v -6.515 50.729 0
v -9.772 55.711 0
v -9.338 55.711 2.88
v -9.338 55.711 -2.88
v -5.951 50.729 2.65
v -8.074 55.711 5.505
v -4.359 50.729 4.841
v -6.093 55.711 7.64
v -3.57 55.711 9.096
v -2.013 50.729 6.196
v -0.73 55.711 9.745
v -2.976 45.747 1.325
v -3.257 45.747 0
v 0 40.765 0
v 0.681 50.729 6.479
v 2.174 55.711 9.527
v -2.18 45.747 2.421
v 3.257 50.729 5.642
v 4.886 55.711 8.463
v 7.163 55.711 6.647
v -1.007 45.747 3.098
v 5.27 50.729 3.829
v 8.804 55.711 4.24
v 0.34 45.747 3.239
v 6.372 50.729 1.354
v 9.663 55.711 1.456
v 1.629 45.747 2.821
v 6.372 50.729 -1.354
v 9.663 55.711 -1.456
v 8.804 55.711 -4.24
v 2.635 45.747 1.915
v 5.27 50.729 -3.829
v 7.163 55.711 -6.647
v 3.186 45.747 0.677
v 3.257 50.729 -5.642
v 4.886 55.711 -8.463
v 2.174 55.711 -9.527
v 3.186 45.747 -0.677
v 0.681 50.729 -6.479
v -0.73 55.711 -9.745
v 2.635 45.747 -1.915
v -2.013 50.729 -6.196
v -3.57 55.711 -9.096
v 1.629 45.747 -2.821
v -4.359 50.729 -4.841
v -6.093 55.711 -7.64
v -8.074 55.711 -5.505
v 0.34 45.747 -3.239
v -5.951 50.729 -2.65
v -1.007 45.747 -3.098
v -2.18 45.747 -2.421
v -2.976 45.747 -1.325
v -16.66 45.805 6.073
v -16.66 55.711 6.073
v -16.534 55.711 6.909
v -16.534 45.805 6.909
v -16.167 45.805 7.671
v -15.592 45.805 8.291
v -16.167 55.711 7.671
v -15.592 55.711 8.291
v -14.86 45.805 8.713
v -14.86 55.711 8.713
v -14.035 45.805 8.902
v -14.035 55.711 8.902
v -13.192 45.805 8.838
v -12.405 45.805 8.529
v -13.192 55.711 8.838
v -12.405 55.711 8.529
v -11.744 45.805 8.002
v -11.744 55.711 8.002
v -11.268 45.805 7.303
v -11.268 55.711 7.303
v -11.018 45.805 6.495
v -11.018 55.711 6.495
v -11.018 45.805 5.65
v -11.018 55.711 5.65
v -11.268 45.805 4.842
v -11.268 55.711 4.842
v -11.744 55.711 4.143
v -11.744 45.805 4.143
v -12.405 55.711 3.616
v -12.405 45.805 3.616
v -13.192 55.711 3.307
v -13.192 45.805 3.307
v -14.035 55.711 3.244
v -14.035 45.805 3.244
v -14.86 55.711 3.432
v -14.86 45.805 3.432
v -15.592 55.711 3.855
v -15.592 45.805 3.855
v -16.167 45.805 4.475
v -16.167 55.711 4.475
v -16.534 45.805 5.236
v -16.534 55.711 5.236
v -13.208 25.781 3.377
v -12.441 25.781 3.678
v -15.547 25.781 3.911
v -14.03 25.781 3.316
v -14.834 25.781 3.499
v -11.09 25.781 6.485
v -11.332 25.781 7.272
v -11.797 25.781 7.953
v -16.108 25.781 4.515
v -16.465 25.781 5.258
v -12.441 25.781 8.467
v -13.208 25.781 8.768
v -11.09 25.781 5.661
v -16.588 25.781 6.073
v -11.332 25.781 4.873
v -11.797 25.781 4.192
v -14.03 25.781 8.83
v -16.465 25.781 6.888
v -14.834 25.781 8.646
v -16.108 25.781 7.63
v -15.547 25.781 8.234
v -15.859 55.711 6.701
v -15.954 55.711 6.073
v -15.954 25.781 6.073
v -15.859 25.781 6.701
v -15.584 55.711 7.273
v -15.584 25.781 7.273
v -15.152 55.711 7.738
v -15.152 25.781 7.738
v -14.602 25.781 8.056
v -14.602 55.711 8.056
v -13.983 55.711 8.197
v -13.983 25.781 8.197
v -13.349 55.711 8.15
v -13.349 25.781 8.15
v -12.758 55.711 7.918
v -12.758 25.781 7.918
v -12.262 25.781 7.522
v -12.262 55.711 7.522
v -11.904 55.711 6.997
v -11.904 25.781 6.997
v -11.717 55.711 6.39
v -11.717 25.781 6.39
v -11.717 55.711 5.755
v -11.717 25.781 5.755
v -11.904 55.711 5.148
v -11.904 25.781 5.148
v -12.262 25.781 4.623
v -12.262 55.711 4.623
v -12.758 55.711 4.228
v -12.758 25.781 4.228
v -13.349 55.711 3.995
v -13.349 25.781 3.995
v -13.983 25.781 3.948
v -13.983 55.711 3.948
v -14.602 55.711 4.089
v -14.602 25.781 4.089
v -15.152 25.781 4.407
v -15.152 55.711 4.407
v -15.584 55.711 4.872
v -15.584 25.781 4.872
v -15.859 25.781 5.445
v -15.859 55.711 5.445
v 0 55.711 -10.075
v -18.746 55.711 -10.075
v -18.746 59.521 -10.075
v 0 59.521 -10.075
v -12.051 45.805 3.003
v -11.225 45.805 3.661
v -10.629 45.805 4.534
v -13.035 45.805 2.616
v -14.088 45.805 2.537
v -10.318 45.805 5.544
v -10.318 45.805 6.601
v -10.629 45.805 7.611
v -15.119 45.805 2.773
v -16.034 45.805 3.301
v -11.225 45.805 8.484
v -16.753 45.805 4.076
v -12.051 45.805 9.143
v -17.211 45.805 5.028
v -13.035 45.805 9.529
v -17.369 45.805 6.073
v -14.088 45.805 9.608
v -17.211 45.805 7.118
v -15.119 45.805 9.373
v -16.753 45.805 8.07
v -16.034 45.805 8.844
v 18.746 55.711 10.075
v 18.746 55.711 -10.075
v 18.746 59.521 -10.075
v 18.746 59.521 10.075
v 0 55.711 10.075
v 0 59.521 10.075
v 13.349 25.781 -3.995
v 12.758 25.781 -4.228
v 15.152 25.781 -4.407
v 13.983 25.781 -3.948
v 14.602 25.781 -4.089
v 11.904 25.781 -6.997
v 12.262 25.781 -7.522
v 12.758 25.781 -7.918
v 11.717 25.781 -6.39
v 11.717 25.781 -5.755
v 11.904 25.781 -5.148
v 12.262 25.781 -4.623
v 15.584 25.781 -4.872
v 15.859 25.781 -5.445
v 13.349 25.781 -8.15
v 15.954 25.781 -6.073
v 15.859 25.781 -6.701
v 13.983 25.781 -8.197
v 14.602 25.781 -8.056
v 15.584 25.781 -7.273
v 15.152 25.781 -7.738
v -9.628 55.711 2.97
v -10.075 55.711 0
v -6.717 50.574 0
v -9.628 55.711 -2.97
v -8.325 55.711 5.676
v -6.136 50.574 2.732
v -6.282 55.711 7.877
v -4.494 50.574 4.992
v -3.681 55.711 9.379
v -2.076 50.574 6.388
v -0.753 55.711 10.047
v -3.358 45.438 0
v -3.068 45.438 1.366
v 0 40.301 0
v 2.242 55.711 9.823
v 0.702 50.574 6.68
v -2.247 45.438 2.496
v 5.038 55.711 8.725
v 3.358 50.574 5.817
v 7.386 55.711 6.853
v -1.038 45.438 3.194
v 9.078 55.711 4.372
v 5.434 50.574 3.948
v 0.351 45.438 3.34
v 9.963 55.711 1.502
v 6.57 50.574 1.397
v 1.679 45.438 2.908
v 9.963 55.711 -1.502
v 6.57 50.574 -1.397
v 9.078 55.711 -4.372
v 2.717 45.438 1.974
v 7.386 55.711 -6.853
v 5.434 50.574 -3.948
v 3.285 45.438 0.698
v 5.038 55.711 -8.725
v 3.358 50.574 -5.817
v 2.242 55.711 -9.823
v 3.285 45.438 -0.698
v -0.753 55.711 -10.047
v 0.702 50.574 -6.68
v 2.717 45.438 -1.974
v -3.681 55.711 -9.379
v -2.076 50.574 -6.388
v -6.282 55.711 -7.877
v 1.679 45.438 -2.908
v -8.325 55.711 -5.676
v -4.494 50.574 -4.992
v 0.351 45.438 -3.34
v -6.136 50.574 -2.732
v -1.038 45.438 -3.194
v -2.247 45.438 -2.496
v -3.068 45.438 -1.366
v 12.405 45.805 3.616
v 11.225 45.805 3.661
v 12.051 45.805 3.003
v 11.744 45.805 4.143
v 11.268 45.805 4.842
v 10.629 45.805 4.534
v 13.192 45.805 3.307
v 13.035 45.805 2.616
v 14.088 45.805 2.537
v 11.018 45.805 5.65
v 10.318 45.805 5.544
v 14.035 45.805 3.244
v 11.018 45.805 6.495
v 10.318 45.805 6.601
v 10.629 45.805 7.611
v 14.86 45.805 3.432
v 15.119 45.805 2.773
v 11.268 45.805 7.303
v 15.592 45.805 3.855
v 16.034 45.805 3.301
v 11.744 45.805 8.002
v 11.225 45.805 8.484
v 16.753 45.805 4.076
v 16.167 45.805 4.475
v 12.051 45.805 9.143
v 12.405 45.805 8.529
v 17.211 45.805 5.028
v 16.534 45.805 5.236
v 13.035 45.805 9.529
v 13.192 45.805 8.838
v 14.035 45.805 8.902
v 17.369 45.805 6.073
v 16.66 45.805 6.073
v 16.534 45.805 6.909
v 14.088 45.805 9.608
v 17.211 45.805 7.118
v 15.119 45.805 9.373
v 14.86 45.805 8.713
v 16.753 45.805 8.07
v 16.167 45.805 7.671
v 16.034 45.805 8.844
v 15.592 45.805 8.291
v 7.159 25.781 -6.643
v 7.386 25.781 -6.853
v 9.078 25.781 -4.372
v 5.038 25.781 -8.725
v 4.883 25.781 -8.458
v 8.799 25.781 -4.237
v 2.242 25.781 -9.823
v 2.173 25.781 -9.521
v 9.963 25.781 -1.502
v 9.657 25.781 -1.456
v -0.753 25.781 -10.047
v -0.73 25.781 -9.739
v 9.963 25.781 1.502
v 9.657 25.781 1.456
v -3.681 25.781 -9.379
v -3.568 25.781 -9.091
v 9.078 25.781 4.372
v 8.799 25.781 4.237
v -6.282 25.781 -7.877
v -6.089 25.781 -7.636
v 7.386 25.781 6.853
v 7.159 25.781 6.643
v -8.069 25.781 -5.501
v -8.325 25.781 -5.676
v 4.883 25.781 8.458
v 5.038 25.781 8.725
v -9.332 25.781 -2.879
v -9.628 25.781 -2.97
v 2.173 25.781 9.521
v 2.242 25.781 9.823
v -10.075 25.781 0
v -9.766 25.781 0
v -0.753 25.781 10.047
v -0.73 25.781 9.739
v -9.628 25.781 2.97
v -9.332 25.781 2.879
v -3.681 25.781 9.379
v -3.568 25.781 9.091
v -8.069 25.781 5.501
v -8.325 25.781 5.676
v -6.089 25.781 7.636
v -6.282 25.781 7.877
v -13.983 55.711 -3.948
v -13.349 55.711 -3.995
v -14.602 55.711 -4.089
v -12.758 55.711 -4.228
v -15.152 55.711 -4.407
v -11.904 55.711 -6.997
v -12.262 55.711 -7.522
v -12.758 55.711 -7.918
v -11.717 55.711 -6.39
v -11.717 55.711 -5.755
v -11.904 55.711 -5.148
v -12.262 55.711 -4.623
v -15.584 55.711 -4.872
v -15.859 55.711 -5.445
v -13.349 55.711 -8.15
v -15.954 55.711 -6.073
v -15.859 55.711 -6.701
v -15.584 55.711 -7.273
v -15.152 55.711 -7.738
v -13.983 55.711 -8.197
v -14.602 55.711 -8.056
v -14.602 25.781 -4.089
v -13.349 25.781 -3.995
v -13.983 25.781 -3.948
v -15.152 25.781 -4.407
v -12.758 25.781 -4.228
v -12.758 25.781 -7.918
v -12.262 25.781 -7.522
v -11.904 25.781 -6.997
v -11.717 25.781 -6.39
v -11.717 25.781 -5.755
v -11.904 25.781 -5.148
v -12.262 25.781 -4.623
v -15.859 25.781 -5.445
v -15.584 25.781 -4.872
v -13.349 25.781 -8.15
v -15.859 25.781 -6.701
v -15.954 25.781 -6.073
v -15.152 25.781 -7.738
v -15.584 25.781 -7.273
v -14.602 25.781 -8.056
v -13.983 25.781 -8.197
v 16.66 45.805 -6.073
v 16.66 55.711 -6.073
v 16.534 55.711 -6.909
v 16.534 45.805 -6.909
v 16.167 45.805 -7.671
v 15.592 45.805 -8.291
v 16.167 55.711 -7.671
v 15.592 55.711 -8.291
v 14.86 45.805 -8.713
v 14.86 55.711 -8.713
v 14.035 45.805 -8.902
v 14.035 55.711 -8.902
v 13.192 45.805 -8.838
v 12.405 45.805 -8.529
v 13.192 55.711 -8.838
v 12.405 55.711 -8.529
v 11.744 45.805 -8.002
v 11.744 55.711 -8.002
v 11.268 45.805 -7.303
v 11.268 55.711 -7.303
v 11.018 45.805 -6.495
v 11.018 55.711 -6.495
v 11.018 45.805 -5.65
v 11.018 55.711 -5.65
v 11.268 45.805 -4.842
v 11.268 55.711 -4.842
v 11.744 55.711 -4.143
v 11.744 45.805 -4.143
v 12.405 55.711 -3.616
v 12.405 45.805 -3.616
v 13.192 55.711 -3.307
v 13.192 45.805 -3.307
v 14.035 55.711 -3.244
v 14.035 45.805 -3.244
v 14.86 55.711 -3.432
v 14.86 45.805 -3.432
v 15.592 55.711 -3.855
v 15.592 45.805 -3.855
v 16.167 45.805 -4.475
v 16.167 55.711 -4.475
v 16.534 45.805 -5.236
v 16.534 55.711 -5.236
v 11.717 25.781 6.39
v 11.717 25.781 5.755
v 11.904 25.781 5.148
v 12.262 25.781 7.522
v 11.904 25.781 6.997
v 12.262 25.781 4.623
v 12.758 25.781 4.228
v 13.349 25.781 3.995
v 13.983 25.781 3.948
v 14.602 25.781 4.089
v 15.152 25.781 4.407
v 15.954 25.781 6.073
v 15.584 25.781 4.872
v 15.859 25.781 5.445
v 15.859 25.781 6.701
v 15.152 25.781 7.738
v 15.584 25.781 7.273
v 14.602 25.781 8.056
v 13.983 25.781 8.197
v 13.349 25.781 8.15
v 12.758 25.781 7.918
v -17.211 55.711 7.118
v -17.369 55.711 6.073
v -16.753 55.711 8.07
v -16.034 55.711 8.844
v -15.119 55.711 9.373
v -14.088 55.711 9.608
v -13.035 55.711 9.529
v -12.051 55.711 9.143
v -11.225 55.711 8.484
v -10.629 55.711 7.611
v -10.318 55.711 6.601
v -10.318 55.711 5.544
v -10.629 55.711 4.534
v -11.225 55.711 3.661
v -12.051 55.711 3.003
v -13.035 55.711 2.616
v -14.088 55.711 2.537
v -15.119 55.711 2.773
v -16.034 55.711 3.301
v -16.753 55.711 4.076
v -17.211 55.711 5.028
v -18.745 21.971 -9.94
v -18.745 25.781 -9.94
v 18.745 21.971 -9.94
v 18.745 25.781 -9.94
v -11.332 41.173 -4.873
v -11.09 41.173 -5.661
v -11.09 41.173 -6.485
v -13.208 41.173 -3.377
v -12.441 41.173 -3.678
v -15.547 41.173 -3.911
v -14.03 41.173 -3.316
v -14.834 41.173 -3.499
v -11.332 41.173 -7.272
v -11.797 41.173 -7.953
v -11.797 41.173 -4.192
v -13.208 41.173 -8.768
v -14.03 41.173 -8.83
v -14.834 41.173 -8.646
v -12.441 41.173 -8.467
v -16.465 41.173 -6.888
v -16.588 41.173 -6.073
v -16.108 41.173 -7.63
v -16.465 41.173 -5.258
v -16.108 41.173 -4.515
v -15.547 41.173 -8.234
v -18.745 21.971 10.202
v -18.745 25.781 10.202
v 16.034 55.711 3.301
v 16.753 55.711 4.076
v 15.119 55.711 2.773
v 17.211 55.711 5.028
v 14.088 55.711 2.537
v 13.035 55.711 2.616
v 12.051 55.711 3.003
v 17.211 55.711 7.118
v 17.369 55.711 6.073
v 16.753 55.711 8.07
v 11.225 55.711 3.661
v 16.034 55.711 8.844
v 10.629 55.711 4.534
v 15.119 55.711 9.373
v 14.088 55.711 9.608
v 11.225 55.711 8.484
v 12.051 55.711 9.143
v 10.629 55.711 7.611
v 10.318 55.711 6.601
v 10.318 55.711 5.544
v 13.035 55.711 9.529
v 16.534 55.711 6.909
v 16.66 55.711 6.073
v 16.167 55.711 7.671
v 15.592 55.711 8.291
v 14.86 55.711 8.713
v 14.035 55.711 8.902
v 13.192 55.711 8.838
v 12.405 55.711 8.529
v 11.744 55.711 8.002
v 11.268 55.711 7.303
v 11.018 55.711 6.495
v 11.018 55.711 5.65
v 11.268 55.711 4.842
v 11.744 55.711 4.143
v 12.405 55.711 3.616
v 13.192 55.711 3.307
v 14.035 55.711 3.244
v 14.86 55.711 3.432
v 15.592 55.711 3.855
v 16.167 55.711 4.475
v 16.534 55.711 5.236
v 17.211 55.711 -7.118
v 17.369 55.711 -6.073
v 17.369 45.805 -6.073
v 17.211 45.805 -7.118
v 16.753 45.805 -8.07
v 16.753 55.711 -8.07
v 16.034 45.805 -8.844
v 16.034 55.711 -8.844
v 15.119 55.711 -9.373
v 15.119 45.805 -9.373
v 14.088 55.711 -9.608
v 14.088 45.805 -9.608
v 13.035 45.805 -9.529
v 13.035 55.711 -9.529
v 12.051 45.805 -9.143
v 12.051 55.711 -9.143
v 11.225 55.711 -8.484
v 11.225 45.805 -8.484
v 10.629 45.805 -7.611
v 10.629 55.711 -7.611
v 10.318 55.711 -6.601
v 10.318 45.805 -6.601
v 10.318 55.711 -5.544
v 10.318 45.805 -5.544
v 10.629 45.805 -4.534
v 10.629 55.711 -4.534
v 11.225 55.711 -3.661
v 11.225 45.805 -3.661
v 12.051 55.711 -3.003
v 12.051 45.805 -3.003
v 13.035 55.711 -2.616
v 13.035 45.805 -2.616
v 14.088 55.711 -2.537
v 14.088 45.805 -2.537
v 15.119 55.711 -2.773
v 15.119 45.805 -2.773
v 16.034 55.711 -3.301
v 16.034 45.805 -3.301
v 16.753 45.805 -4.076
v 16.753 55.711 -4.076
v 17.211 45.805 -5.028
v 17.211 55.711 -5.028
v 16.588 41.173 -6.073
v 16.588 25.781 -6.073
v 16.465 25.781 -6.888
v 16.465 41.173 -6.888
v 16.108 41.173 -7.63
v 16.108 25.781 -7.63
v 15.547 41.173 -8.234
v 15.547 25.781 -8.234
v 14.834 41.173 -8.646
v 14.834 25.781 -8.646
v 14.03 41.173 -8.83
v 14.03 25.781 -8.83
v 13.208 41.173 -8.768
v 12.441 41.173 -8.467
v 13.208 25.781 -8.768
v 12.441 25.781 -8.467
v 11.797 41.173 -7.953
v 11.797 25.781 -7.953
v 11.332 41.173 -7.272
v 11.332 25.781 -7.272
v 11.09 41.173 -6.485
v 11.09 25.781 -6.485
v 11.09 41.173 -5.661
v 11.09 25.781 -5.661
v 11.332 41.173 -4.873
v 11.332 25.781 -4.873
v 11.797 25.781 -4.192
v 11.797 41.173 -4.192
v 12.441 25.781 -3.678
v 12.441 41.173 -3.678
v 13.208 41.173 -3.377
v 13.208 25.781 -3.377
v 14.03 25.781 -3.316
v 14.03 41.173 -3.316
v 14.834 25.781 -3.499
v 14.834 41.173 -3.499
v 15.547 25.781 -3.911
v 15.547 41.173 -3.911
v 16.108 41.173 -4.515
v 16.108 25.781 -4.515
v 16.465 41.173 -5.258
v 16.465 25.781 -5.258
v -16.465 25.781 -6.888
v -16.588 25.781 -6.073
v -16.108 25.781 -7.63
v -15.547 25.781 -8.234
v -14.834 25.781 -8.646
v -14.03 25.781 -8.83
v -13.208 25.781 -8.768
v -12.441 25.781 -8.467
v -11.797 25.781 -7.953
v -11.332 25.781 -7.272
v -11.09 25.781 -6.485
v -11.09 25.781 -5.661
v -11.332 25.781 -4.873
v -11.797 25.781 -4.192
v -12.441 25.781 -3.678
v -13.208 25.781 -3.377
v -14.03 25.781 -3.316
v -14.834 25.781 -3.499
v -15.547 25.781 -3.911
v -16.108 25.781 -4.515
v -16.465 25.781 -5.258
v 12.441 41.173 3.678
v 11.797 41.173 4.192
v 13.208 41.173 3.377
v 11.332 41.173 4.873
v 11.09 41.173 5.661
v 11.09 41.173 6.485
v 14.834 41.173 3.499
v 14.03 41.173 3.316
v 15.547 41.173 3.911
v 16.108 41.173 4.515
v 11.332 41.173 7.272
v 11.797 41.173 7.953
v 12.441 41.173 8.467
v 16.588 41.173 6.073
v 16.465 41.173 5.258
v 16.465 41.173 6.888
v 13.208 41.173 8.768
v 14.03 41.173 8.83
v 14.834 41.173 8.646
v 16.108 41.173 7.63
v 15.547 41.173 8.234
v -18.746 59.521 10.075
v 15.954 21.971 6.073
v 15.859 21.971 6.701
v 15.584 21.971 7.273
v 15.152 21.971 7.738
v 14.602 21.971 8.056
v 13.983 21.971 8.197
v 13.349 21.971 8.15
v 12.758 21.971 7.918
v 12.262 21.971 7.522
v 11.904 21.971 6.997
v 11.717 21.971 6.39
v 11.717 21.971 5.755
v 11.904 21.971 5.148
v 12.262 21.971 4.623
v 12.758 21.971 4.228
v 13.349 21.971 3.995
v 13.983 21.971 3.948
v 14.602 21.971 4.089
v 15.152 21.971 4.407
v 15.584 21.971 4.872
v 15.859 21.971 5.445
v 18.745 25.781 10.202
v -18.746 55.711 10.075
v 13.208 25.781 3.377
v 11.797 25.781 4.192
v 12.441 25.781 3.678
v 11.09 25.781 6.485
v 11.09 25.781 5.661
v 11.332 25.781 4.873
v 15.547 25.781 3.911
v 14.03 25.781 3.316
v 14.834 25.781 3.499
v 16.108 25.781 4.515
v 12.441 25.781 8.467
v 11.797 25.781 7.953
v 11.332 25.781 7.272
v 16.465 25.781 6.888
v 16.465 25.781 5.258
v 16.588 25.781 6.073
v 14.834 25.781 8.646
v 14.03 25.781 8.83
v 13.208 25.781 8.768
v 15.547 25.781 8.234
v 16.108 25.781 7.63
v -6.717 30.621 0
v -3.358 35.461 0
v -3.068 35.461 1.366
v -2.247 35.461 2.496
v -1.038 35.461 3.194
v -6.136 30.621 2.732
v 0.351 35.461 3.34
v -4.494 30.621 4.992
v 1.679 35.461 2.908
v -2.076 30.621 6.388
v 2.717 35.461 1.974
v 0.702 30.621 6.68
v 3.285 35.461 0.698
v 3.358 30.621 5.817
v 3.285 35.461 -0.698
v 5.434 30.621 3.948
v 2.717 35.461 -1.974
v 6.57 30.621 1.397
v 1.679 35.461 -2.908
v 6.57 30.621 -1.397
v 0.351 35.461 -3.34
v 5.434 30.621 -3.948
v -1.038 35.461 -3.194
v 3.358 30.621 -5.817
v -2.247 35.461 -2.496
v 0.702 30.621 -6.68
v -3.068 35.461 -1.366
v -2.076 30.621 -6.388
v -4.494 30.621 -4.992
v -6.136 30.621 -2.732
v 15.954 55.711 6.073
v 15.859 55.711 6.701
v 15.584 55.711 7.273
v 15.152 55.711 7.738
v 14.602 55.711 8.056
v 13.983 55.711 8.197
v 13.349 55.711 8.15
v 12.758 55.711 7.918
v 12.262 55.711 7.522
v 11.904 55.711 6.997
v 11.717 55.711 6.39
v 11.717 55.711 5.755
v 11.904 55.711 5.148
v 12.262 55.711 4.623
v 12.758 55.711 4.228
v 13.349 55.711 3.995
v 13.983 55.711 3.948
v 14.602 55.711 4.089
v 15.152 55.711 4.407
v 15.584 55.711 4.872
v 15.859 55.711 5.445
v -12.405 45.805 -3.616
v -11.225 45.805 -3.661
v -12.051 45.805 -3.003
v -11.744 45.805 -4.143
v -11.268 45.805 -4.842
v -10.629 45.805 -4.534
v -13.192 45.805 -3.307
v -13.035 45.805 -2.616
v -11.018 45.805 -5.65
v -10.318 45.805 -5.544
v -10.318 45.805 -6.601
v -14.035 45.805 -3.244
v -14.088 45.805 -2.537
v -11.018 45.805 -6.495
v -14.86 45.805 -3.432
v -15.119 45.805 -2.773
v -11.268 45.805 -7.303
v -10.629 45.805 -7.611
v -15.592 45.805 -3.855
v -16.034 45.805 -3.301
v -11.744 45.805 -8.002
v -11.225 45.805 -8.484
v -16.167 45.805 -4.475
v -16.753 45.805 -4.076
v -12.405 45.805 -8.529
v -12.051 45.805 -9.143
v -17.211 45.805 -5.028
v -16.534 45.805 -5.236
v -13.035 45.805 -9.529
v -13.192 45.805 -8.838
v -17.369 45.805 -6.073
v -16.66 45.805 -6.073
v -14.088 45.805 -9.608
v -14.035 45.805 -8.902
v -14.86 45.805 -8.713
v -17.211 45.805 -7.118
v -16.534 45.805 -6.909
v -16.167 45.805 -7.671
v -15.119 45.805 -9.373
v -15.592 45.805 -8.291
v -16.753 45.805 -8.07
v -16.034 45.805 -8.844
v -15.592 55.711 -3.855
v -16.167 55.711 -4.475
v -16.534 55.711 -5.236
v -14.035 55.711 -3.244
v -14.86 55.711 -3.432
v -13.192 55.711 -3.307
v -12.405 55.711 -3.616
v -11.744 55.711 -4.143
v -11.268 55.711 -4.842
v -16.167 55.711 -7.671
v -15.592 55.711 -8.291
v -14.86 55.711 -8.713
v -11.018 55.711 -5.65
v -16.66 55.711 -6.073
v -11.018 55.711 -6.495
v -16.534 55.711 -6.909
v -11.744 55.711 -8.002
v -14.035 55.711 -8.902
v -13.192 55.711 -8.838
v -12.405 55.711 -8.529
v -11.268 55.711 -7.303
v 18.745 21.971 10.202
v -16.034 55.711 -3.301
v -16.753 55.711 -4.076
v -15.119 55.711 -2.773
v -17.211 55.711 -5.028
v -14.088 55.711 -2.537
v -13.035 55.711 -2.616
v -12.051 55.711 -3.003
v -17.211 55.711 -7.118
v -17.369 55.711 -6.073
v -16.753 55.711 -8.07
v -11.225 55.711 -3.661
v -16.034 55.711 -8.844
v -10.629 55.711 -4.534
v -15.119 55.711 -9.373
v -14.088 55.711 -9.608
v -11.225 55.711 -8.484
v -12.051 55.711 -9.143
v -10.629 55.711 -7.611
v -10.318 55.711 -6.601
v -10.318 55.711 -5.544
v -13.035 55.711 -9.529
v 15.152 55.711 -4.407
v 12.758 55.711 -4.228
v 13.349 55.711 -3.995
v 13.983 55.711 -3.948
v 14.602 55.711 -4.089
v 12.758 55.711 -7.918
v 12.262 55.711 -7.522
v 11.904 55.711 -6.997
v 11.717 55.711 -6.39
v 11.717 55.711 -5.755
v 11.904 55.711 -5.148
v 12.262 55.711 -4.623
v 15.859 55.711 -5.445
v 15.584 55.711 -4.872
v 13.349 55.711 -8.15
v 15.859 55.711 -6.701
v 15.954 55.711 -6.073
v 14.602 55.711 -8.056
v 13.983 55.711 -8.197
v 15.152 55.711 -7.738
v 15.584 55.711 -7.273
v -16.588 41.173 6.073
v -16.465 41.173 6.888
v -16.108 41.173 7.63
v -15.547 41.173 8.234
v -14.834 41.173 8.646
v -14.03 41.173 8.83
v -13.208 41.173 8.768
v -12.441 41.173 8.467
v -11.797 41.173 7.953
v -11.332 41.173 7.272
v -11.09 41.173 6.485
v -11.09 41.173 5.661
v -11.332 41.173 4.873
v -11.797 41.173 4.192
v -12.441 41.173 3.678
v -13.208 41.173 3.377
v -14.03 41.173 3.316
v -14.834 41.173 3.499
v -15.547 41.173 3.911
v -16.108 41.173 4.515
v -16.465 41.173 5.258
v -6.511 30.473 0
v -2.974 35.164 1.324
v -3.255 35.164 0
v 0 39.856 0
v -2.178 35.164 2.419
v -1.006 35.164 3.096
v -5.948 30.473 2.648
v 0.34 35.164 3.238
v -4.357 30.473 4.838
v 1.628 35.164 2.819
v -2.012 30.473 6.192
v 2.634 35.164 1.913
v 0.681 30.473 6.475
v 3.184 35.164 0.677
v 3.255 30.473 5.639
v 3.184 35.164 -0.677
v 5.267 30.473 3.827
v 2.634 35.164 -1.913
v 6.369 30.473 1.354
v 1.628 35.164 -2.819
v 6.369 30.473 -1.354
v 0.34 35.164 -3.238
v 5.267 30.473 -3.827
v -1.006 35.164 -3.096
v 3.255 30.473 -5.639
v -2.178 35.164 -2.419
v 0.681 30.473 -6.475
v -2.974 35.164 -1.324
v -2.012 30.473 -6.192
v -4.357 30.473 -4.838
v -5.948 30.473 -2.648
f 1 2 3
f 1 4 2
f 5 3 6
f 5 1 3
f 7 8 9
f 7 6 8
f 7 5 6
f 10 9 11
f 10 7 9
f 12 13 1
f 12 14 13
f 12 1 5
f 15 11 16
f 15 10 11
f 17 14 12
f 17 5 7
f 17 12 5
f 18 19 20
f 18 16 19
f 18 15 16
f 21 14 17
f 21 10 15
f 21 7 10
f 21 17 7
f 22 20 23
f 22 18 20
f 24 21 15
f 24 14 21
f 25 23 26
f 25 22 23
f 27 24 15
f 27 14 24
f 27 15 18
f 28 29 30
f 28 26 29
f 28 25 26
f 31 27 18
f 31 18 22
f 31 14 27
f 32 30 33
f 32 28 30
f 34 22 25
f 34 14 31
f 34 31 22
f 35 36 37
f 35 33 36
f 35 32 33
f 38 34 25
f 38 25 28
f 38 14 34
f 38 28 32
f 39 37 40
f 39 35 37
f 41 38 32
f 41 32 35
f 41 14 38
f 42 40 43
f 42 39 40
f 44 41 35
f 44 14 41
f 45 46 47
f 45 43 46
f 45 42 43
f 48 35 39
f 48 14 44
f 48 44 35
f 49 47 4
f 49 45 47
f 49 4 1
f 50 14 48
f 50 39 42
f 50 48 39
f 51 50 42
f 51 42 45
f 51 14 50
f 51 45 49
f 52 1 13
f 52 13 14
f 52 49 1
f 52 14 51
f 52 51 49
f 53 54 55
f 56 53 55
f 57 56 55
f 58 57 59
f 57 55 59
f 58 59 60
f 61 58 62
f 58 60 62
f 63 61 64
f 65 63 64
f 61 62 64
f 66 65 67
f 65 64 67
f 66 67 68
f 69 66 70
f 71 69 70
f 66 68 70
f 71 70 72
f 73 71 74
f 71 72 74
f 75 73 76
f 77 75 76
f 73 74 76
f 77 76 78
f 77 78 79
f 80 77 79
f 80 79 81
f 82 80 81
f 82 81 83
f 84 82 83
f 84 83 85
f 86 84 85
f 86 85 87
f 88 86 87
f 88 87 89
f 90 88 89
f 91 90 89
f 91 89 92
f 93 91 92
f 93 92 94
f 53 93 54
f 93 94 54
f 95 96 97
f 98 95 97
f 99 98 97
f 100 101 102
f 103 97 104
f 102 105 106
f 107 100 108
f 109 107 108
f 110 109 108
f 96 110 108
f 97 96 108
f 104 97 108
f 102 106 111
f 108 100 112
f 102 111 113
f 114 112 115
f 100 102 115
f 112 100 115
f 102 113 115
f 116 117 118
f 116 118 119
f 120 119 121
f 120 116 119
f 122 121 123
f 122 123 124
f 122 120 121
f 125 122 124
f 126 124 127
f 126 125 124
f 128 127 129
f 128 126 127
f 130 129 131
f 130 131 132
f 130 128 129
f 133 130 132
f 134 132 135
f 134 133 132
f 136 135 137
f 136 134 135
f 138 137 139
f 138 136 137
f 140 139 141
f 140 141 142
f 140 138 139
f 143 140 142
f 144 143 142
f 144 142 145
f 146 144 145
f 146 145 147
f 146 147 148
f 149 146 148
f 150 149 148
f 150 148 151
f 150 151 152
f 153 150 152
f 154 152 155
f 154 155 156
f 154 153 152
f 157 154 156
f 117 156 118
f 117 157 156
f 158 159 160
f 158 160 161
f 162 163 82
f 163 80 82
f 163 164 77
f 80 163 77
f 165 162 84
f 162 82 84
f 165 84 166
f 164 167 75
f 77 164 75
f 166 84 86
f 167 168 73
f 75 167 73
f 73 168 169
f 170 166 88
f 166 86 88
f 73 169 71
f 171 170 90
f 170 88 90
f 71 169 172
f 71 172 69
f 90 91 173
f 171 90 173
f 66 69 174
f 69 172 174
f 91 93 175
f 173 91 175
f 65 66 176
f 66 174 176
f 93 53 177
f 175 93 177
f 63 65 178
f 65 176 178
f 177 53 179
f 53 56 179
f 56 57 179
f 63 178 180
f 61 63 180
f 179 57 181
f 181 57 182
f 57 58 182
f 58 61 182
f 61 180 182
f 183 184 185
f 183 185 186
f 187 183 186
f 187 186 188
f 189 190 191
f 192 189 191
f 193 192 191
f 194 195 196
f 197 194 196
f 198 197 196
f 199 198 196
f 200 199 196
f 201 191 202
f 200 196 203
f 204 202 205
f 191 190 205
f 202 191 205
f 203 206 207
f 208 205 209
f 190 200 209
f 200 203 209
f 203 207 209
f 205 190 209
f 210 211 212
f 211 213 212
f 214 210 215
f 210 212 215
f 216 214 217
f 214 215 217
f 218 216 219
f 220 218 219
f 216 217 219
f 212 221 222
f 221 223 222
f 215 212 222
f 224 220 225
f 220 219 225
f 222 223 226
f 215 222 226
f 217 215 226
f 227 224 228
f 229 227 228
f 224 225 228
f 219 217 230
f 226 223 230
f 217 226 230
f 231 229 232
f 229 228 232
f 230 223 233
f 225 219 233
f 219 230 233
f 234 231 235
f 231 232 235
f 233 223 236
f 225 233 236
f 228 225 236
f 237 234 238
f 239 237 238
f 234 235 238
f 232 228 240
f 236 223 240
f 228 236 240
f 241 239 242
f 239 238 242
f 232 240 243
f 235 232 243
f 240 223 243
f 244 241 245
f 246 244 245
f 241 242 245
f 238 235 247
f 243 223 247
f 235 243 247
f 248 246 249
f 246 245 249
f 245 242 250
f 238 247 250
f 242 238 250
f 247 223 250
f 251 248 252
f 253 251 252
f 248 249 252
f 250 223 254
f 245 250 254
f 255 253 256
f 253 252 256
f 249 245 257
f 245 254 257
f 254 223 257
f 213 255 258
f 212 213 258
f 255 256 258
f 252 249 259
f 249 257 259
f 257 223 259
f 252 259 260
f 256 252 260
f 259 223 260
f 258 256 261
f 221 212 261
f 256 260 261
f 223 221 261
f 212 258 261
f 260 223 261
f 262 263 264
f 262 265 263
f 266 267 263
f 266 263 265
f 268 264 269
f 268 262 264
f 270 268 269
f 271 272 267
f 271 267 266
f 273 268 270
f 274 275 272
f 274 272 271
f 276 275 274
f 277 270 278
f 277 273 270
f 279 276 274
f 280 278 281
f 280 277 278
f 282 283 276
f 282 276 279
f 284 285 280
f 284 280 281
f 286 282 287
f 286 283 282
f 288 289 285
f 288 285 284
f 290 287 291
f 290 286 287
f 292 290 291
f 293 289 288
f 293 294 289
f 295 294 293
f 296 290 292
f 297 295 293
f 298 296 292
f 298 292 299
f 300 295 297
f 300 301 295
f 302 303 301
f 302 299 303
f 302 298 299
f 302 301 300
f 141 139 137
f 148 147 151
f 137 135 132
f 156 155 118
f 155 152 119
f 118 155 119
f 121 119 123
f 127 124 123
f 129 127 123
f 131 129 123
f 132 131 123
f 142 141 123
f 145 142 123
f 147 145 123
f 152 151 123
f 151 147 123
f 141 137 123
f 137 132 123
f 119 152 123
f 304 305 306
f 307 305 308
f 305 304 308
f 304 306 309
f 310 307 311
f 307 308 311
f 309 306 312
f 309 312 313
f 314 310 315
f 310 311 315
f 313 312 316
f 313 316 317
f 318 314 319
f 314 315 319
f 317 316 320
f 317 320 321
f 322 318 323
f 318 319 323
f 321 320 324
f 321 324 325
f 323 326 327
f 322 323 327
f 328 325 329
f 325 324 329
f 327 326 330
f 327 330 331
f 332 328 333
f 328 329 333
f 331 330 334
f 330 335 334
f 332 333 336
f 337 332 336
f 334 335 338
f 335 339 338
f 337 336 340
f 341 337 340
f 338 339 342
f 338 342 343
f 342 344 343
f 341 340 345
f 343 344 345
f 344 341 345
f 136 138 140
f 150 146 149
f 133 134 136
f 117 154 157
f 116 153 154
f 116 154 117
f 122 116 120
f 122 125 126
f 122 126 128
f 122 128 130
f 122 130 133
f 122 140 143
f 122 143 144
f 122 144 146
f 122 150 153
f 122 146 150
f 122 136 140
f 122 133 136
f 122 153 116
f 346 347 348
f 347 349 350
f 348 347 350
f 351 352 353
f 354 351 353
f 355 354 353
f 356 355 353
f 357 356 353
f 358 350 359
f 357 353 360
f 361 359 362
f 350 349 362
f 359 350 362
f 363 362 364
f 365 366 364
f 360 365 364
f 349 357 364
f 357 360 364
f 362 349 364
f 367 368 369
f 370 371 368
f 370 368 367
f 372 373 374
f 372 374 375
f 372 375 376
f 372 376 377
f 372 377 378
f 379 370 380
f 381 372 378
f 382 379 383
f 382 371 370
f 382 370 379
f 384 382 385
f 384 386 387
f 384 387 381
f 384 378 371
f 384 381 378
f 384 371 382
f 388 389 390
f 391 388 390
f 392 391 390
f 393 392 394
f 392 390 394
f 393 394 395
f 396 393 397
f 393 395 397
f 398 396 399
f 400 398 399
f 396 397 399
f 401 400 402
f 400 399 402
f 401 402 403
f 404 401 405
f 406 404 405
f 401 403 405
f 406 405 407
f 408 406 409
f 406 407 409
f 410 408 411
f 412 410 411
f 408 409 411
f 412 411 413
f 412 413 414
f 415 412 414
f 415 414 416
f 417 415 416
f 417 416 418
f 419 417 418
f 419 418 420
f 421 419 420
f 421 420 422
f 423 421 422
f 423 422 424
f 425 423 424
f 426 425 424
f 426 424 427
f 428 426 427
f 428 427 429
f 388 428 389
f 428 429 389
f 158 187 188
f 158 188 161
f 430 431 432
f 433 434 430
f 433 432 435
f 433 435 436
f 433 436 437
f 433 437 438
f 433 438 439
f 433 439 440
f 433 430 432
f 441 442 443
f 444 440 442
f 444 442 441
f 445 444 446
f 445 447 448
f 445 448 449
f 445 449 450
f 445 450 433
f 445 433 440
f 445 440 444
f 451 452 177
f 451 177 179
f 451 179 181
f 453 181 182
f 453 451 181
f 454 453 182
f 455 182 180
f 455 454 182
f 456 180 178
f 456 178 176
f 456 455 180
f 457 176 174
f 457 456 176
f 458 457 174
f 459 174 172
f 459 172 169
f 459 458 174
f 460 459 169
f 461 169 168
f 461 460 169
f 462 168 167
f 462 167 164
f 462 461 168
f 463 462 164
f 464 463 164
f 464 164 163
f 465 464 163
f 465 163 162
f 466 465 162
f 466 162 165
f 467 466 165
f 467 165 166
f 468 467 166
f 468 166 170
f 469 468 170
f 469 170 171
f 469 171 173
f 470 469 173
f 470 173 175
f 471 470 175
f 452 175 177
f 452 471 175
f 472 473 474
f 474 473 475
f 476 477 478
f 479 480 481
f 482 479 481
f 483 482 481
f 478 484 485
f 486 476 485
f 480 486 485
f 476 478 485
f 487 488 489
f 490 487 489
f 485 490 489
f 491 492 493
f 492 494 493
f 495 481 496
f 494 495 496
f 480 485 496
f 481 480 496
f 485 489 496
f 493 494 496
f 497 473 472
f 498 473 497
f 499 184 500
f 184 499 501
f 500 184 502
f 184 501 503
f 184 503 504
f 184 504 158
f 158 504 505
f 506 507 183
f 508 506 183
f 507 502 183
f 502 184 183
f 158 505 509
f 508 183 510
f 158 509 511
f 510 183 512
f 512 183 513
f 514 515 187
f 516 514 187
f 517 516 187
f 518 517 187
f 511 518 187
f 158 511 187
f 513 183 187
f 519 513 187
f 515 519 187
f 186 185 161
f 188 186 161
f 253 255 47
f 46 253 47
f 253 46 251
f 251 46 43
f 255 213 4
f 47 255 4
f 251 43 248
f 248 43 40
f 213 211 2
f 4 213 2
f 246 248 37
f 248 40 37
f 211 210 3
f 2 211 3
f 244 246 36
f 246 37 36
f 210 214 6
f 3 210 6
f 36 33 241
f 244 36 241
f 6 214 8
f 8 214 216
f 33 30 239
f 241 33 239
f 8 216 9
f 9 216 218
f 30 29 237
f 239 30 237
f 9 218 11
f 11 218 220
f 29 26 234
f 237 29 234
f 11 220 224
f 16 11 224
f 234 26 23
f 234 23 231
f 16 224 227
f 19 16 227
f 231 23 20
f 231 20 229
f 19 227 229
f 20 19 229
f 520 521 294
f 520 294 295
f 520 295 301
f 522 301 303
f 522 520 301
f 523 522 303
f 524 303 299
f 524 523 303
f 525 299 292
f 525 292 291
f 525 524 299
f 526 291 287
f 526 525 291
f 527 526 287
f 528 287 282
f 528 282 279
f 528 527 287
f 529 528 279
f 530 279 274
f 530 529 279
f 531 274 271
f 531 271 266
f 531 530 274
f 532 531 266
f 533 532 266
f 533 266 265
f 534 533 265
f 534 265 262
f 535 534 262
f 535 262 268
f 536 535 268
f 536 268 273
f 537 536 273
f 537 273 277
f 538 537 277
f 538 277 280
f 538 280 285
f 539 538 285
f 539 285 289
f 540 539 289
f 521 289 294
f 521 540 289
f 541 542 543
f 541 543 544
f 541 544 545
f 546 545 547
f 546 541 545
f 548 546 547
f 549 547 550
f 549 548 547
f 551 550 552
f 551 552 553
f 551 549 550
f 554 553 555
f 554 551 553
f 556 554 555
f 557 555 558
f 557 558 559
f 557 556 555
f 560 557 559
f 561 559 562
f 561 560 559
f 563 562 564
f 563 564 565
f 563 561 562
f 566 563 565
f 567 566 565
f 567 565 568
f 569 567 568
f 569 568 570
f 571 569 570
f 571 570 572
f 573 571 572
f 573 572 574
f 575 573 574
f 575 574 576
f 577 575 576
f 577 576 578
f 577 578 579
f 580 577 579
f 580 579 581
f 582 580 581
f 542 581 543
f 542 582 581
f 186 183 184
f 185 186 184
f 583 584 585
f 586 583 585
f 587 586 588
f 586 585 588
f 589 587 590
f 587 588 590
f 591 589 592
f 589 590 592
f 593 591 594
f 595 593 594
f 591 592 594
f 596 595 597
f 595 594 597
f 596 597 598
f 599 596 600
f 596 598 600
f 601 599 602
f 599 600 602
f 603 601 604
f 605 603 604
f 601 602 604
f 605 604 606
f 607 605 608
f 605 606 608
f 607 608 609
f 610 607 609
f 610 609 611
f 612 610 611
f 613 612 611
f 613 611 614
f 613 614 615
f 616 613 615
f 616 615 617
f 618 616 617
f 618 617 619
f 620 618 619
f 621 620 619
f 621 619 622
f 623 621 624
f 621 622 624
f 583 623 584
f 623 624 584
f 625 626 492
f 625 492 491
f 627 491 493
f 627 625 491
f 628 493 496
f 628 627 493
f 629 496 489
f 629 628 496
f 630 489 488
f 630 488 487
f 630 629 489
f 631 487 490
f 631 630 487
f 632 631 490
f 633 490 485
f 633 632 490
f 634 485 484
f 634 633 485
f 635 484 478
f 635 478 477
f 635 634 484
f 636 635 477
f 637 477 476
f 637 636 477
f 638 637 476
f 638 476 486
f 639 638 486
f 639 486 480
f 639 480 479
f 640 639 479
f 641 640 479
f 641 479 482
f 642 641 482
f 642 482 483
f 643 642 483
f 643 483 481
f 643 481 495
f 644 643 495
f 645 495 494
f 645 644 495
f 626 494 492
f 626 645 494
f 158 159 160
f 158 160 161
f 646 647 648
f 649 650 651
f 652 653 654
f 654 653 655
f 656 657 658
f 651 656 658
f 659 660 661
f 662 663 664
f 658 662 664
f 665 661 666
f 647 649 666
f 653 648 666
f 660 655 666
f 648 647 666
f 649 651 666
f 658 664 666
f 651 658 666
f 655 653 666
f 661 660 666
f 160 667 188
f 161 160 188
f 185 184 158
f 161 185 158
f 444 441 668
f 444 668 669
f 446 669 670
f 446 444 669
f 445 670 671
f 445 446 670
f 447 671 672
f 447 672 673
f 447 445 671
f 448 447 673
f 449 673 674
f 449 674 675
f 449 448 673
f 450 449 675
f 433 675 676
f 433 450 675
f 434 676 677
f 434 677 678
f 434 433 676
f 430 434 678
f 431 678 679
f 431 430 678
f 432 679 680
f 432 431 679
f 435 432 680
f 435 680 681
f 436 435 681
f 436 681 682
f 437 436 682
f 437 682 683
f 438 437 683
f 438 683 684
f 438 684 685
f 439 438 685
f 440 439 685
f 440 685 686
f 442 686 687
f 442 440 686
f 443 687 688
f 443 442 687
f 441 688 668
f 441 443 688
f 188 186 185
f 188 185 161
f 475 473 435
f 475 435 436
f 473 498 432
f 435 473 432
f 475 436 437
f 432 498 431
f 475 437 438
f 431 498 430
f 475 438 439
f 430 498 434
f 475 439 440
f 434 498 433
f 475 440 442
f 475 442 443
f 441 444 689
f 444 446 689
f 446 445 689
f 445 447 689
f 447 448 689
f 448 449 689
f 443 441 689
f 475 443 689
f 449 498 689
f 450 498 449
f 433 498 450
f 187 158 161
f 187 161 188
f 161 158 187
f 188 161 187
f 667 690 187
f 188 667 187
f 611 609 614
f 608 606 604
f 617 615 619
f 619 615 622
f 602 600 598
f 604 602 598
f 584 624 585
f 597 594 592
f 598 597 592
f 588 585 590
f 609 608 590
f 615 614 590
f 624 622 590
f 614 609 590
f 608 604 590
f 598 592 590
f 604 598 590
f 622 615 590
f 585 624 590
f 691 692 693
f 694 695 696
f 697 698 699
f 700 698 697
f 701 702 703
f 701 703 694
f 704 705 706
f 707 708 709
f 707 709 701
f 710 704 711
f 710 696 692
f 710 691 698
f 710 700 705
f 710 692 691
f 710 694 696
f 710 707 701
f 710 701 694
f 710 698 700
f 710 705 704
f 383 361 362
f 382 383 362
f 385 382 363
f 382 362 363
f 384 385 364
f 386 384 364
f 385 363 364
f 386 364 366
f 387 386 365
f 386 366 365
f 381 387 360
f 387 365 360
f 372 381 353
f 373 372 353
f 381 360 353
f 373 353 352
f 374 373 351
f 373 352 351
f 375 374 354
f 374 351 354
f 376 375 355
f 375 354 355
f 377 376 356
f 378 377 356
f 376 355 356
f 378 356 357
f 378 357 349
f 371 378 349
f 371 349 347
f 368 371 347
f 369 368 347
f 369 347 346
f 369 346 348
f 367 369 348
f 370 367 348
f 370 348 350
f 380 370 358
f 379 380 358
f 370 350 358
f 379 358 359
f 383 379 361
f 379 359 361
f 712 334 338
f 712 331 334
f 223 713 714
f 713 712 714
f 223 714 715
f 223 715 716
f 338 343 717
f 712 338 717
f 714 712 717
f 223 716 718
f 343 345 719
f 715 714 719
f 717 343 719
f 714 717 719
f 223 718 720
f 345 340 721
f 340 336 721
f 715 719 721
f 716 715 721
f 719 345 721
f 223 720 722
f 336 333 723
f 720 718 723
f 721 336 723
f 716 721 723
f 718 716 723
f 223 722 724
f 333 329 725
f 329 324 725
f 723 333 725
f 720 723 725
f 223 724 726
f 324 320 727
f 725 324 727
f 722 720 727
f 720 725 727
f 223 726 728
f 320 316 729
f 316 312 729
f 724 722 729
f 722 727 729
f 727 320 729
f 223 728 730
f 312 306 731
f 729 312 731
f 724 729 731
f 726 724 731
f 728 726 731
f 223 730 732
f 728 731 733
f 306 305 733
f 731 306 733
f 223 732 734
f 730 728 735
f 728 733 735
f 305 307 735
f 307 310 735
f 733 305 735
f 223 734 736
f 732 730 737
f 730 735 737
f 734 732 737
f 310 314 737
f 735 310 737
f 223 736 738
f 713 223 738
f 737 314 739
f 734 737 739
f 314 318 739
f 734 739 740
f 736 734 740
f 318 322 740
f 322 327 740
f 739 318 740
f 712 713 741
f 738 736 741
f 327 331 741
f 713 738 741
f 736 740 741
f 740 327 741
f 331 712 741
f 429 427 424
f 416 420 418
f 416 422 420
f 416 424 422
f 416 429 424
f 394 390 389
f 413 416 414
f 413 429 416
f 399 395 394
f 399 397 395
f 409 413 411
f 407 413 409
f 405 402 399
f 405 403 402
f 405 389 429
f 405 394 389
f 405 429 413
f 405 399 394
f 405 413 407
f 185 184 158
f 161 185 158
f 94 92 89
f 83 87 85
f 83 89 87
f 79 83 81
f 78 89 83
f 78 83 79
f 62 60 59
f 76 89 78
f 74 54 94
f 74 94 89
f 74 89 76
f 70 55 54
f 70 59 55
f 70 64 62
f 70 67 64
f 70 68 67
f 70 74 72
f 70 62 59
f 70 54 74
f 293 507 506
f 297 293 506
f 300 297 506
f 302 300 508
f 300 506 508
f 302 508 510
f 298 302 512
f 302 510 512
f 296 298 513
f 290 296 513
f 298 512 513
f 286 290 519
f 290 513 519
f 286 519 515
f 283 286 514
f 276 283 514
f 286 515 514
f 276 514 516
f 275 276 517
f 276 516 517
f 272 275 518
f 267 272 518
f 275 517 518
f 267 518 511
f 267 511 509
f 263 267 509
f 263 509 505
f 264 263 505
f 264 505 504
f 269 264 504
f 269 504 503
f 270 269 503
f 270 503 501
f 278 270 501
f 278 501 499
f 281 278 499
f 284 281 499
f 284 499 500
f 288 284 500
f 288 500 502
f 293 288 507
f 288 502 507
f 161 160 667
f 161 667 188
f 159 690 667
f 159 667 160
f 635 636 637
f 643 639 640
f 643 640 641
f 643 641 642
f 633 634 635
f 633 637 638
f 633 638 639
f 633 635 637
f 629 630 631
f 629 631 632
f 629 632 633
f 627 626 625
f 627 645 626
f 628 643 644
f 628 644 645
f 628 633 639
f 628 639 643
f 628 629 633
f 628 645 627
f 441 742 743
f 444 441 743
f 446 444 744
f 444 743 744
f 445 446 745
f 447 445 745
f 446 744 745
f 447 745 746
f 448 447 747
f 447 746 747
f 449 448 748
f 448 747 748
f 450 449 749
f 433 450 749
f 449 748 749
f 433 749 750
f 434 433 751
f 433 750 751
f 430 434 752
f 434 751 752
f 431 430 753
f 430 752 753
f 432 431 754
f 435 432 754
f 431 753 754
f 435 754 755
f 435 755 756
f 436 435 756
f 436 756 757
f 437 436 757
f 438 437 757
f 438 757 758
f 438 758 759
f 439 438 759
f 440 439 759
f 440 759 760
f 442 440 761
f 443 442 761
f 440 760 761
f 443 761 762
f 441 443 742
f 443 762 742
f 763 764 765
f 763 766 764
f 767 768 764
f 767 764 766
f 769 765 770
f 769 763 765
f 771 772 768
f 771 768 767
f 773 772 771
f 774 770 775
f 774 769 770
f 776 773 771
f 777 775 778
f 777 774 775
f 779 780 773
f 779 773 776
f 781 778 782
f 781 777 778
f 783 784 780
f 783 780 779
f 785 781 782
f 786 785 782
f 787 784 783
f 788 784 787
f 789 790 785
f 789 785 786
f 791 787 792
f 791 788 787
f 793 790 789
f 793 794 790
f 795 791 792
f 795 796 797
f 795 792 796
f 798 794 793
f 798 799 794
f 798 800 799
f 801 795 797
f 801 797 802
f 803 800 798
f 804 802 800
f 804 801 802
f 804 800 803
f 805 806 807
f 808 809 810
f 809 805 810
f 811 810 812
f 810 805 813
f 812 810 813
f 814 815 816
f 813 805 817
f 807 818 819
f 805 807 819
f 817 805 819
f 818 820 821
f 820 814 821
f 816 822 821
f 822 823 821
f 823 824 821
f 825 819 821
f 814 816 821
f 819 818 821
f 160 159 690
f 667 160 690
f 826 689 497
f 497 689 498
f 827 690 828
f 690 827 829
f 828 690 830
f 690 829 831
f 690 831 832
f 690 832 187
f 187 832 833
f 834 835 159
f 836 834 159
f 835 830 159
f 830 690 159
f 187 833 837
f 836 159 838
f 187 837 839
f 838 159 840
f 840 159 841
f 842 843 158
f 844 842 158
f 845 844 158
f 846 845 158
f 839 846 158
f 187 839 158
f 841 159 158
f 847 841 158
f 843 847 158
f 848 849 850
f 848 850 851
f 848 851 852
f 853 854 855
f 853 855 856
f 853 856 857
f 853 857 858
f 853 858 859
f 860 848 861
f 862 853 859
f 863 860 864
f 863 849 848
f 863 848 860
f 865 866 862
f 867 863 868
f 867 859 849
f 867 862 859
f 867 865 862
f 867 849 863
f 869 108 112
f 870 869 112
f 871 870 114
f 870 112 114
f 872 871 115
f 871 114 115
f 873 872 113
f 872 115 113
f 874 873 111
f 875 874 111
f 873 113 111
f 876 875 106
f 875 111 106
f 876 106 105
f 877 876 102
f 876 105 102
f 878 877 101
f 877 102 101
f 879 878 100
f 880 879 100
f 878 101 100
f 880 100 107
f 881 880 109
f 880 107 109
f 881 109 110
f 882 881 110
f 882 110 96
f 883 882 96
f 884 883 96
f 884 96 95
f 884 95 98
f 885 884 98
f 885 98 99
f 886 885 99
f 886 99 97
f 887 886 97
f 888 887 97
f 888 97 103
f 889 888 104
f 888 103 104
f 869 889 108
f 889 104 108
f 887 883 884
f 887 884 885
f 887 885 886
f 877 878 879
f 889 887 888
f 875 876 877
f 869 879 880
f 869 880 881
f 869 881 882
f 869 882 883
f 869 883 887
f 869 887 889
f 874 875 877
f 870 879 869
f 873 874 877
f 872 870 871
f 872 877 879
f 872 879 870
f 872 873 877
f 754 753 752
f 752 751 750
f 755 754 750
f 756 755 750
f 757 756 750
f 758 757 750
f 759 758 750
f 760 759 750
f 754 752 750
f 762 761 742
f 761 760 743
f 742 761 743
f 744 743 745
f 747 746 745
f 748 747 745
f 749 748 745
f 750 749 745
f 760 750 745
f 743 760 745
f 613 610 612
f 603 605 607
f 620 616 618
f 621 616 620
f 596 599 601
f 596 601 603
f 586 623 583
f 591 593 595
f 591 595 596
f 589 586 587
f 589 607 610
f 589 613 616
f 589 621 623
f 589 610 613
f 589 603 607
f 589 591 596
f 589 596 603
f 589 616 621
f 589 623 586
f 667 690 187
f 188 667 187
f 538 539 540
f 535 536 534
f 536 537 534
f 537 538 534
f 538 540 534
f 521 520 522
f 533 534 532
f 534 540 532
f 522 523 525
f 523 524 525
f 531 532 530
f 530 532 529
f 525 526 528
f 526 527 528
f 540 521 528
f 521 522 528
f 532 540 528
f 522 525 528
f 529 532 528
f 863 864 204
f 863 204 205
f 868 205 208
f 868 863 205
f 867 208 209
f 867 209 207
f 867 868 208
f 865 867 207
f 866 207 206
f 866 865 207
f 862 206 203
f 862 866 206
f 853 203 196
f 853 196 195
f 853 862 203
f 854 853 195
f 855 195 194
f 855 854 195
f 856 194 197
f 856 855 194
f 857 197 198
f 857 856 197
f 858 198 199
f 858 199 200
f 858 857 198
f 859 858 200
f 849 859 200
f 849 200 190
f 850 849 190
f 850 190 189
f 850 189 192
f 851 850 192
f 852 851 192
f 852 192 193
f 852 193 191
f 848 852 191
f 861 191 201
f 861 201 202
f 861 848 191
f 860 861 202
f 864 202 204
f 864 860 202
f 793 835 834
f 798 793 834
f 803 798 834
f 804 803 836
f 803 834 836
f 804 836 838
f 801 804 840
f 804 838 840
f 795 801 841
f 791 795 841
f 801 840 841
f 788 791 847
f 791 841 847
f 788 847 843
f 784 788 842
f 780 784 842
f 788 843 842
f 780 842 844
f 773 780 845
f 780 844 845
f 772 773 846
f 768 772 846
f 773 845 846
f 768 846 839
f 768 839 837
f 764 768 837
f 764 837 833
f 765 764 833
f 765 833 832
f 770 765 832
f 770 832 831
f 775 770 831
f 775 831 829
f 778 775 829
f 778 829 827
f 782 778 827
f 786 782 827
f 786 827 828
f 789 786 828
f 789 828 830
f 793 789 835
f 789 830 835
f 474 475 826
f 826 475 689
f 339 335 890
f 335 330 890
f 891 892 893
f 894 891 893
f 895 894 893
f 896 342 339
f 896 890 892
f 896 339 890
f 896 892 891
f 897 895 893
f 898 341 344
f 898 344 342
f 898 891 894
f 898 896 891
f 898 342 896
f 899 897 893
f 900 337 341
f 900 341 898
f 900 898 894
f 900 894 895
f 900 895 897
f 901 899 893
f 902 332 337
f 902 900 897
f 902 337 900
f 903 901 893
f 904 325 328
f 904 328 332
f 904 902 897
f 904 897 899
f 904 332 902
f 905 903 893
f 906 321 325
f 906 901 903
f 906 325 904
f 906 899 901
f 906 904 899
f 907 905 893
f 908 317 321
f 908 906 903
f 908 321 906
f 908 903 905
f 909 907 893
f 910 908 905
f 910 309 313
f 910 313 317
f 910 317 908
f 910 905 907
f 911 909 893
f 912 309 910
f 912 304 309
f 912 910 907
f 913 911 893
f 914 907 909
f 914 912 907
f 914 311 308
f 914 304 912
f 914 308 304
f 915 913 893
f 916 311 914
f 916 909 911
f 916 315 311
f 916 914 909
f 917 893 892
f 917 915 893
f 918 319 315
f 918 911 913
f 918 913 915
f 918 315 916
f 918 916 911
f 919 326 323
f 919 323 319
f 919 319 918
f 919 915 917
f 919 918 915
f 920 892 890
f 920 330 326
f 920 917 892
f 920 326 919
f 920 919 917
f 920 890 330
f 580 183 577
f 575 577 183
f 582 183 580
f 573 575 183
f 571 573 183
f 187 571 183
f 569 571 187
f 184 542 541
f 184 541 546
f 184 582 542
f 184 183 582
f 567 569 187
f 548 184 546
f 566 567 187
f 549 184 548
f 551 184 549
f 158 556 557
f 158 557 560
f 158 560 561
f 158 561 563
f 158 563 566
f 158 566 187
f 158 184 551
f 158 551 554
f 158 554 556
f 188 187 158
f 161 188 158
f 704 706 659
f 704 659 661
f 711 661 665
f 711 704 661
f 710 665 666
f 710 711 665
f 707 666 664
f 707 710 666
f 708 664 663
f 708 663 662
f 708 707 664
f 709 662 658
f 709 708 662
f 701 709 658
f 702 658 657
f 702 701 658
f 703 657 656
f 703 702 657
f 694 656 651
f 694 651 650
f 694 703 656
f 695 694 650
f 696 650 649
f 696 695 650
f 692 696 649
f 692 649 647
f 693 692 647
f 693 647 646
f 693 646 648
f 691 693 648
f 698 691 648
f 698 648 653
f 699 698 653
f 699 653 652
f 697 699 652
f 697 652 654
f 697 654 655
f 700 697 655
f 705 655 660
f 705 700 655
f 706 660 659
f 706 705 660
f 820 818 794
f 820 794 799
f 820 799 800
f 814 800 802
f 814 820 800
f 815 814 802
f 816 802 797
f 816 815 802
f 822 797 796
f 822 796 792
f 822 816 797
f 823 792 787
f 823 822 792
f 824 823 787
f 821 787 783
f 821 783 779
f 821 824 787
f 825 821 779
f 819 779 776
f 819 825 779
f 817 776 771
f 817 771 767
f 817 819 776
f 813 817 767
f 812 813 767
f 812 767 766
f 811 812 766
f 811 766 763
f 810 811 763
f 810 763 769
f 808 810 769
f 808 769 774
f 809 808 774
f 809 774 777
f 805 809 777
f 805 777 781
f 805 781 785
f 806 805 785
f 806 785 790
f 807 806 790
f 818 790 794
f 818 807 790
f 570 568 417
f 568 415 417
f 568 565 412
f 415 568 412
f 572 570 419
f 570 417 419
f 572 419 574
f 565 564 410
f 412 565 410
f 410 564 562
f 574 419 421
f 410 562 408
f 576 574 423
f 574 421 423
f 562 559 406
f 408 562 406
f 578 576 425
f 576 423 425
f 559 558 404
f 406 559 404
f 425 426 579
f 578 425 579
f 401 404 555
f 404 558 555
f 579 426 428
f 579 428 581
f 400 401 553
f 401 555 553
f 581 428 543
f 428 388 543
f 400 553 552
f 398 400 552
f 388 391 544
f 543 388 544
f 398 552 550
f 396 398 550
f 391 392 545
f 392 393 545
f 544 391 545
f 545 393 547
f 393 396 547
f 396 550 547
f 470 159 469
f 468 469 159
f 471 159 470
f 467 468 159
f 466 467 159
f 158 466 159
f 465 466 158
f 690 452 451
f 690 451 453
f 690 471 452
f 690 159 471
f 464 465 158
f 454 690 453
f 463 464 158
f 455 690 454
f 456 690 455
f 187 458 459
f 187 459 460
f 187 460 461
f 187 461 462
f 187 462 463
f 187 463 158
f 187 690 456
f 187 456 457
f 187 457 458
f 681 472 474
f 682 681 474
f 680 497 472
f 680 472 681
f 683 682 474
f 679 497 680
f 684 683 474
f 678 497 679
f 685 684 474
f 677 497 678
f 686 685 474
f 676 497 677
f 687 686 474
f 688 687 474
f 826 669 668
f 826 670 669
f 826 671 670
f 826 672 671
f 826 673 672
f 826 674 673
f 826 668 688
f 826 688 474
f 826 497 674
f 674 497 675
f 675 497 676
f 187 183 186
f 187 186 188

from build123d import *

# Parameters (mm, degrees)
F2_T      = -0.254
F3_W      = 18.7457744032
F3_H      = 20.1506689191
F4_DEPTH  = 3.81
F5_R      = 2.130532704
F6_DEPTH  = 29.929663986
F5_R_2    = 3.5450449464
F5_R_3    = 2.8368433818
F8_DEPTH  = 9.906
F9_R      = 2.7648346721
F10_DEPTH = 15.3924
F14_T     = -0.254
F15_W     = 18.7452
F15_H     = 20.1422
F15_R     = 2.130532704
F16_DEPTH = 3.81


# Not quite as in the source:
# - the program builds the solid bodies; features that only make, move or delete a surface that nothing else refers to are left out


with BuildPart() as f1:
    # F0 (on Top) → F1 (revolve)
    with BuildSketch(Plane.XY):
        Polygon((-10.0753344595, 55.7106658816), (0, 40.3013341129), (0, 55.7106658816), align=None)
    revolve(axis=Axis((0, 48.0059999973, 0), (0, 1, 0)))

    # F2
    f2_openings = [f1.faces().sort_by_distance(p)[0] for p in [
        (0, 55.710666, 0),
    ]]
    offset(amount=F2_T, openings=f2_openings)


with BuildPart() as f1b:
    # F0 (on Top) → F1, piece 2 (revolve)
    with BuildSketch(Plane.XY):
        Polygon((-10.0753344595, 25.7810018957), (0, 25.7810018957), (0, 40.3013341129), align=None)
    revolve(axis=Axis((0, 48.0059999973, 0), (0, 1, 0)))

    # F14
    f14_openings = [f1b.faces().sort_by_distance(p)[0] for p in [
        (0, 25.781002, 0),
    ]]
    offset(amount=F14_T, openings=f14_openings)


with BuildPart() as f4:
    # F3 (on face) → F4 (new body)
    with BuildSketch(Plane(origin=(0, 55.7106658816, 0), x_dir=(-1, 0, 0), z_dir=(0, 1, 0))):
        with Locations((-9.3728872016, 0)):
            Rectangle(F3_W, F3_H)
    extrude(amount=F4_DEPTH)

    # F5 (on face) → F8 (join)
    with BuildSketch(Plane.XZ.offset(-55.7106658816)):
        with Locations((13.8234719634, 6.072612945)):
            Circle(F5_R_2)
        with Locations((13.8234719634, 6.072612945)):
            Circle(F5_R_3, mode=Mode.SUBTRACT)
    extrude(amount=F8_DEPTH)


with BuildPart() as f6:
    # F5 (on face) → F6 (new body, through all)
    with BuildSketch(Plane.XZ.offset(-55.7106658816)):
        with Locations((13.8234719634, 6.072612945)):
            Circle(F5_R)
    extrude(amount=F6_DEPTH)


with BuildPart() as f10:
    # F9 (on face) → F10 (new body)
    with BuildSketch(Plane.XZ.offset(-25.7810018957)):
        with Locations((13.8234719634, 6.072612945)):
            Circle(F9_R)
    extrude(amount=-F10_DEPTH)


with BuildPart() as f11_1:
    # F11: instance of F4
    add(f4.part.mirror(Plane(origin=(0, 57.6156658816, 0), x_dir=(0, -1, 0), z_dir=(-1, 0, 0))))


with BuildPart() as f11_2:
    # F11: instance of F6
    add(f6.part.mirror(Plane(origin=(0, 57.6156658816, 0), x_dir=(0, -1, 0), z_dir=(-1, 0, 0))))


with BuildPart() as f11_3:
    # F11: instance of F10
    add(f10.part.mirror(Plane(origin=(0, 57.6156658816, 0), x_dir=(0, -1, 0), z_dir=(-1, 0, 0))))


with BuildPart() as f12_1:
    # F12: instance of F6
    add(f6.part.mirror(Plane.XY))


with BuildPart() as f12_2:
    # F12: instance of F10
    add(f10.part.mirror(Plane.XY))


with BuildPart() as f12_3:
    # F12: instance of F4
    add(f4.part.mirror(Plane.XY))


with BuildPart() as f13_1:
    # F13: instance of F11_1
    add(f11_1.part.mirror(Plane.XY))


with BuildPart() as f13_2:
    # F13: instance of F11_2
    add(f11_2.part.mirror(Plane.XY))


with BuildPart() as f13_3:
    # F13: instance of F11_3
    add(f11_3.part.mirror(Plane.XY))


with BuildPart() as f16:
    # F15 (on face) → F16 (new body)
    with BuildSketch(Plane.XZ.offset(-25.7810018957)):
        with Locations((9.3726, 0.1313106309)):
            Rectangle(F15_W, F15_H)
        with Locations((13.8234719634, 6.072612945)):
            Circle(F15_R, mode=Mode.SUBTRACT)
        with Locations((-9.3726, 0.1313106309)):
            Rectangle(F15_W, F15_H)
    extrude(amount=F16_DEPTH)


solid = Compound([f1.part, f1b.part, f4.part, f6.part, f10.part, f11_1.part, f11_2.part, f11_3.part, f12_1.part, f12_2.part, f12_3.part, f13_1.part, f13_2.part, f13_3.part, f16.part])
